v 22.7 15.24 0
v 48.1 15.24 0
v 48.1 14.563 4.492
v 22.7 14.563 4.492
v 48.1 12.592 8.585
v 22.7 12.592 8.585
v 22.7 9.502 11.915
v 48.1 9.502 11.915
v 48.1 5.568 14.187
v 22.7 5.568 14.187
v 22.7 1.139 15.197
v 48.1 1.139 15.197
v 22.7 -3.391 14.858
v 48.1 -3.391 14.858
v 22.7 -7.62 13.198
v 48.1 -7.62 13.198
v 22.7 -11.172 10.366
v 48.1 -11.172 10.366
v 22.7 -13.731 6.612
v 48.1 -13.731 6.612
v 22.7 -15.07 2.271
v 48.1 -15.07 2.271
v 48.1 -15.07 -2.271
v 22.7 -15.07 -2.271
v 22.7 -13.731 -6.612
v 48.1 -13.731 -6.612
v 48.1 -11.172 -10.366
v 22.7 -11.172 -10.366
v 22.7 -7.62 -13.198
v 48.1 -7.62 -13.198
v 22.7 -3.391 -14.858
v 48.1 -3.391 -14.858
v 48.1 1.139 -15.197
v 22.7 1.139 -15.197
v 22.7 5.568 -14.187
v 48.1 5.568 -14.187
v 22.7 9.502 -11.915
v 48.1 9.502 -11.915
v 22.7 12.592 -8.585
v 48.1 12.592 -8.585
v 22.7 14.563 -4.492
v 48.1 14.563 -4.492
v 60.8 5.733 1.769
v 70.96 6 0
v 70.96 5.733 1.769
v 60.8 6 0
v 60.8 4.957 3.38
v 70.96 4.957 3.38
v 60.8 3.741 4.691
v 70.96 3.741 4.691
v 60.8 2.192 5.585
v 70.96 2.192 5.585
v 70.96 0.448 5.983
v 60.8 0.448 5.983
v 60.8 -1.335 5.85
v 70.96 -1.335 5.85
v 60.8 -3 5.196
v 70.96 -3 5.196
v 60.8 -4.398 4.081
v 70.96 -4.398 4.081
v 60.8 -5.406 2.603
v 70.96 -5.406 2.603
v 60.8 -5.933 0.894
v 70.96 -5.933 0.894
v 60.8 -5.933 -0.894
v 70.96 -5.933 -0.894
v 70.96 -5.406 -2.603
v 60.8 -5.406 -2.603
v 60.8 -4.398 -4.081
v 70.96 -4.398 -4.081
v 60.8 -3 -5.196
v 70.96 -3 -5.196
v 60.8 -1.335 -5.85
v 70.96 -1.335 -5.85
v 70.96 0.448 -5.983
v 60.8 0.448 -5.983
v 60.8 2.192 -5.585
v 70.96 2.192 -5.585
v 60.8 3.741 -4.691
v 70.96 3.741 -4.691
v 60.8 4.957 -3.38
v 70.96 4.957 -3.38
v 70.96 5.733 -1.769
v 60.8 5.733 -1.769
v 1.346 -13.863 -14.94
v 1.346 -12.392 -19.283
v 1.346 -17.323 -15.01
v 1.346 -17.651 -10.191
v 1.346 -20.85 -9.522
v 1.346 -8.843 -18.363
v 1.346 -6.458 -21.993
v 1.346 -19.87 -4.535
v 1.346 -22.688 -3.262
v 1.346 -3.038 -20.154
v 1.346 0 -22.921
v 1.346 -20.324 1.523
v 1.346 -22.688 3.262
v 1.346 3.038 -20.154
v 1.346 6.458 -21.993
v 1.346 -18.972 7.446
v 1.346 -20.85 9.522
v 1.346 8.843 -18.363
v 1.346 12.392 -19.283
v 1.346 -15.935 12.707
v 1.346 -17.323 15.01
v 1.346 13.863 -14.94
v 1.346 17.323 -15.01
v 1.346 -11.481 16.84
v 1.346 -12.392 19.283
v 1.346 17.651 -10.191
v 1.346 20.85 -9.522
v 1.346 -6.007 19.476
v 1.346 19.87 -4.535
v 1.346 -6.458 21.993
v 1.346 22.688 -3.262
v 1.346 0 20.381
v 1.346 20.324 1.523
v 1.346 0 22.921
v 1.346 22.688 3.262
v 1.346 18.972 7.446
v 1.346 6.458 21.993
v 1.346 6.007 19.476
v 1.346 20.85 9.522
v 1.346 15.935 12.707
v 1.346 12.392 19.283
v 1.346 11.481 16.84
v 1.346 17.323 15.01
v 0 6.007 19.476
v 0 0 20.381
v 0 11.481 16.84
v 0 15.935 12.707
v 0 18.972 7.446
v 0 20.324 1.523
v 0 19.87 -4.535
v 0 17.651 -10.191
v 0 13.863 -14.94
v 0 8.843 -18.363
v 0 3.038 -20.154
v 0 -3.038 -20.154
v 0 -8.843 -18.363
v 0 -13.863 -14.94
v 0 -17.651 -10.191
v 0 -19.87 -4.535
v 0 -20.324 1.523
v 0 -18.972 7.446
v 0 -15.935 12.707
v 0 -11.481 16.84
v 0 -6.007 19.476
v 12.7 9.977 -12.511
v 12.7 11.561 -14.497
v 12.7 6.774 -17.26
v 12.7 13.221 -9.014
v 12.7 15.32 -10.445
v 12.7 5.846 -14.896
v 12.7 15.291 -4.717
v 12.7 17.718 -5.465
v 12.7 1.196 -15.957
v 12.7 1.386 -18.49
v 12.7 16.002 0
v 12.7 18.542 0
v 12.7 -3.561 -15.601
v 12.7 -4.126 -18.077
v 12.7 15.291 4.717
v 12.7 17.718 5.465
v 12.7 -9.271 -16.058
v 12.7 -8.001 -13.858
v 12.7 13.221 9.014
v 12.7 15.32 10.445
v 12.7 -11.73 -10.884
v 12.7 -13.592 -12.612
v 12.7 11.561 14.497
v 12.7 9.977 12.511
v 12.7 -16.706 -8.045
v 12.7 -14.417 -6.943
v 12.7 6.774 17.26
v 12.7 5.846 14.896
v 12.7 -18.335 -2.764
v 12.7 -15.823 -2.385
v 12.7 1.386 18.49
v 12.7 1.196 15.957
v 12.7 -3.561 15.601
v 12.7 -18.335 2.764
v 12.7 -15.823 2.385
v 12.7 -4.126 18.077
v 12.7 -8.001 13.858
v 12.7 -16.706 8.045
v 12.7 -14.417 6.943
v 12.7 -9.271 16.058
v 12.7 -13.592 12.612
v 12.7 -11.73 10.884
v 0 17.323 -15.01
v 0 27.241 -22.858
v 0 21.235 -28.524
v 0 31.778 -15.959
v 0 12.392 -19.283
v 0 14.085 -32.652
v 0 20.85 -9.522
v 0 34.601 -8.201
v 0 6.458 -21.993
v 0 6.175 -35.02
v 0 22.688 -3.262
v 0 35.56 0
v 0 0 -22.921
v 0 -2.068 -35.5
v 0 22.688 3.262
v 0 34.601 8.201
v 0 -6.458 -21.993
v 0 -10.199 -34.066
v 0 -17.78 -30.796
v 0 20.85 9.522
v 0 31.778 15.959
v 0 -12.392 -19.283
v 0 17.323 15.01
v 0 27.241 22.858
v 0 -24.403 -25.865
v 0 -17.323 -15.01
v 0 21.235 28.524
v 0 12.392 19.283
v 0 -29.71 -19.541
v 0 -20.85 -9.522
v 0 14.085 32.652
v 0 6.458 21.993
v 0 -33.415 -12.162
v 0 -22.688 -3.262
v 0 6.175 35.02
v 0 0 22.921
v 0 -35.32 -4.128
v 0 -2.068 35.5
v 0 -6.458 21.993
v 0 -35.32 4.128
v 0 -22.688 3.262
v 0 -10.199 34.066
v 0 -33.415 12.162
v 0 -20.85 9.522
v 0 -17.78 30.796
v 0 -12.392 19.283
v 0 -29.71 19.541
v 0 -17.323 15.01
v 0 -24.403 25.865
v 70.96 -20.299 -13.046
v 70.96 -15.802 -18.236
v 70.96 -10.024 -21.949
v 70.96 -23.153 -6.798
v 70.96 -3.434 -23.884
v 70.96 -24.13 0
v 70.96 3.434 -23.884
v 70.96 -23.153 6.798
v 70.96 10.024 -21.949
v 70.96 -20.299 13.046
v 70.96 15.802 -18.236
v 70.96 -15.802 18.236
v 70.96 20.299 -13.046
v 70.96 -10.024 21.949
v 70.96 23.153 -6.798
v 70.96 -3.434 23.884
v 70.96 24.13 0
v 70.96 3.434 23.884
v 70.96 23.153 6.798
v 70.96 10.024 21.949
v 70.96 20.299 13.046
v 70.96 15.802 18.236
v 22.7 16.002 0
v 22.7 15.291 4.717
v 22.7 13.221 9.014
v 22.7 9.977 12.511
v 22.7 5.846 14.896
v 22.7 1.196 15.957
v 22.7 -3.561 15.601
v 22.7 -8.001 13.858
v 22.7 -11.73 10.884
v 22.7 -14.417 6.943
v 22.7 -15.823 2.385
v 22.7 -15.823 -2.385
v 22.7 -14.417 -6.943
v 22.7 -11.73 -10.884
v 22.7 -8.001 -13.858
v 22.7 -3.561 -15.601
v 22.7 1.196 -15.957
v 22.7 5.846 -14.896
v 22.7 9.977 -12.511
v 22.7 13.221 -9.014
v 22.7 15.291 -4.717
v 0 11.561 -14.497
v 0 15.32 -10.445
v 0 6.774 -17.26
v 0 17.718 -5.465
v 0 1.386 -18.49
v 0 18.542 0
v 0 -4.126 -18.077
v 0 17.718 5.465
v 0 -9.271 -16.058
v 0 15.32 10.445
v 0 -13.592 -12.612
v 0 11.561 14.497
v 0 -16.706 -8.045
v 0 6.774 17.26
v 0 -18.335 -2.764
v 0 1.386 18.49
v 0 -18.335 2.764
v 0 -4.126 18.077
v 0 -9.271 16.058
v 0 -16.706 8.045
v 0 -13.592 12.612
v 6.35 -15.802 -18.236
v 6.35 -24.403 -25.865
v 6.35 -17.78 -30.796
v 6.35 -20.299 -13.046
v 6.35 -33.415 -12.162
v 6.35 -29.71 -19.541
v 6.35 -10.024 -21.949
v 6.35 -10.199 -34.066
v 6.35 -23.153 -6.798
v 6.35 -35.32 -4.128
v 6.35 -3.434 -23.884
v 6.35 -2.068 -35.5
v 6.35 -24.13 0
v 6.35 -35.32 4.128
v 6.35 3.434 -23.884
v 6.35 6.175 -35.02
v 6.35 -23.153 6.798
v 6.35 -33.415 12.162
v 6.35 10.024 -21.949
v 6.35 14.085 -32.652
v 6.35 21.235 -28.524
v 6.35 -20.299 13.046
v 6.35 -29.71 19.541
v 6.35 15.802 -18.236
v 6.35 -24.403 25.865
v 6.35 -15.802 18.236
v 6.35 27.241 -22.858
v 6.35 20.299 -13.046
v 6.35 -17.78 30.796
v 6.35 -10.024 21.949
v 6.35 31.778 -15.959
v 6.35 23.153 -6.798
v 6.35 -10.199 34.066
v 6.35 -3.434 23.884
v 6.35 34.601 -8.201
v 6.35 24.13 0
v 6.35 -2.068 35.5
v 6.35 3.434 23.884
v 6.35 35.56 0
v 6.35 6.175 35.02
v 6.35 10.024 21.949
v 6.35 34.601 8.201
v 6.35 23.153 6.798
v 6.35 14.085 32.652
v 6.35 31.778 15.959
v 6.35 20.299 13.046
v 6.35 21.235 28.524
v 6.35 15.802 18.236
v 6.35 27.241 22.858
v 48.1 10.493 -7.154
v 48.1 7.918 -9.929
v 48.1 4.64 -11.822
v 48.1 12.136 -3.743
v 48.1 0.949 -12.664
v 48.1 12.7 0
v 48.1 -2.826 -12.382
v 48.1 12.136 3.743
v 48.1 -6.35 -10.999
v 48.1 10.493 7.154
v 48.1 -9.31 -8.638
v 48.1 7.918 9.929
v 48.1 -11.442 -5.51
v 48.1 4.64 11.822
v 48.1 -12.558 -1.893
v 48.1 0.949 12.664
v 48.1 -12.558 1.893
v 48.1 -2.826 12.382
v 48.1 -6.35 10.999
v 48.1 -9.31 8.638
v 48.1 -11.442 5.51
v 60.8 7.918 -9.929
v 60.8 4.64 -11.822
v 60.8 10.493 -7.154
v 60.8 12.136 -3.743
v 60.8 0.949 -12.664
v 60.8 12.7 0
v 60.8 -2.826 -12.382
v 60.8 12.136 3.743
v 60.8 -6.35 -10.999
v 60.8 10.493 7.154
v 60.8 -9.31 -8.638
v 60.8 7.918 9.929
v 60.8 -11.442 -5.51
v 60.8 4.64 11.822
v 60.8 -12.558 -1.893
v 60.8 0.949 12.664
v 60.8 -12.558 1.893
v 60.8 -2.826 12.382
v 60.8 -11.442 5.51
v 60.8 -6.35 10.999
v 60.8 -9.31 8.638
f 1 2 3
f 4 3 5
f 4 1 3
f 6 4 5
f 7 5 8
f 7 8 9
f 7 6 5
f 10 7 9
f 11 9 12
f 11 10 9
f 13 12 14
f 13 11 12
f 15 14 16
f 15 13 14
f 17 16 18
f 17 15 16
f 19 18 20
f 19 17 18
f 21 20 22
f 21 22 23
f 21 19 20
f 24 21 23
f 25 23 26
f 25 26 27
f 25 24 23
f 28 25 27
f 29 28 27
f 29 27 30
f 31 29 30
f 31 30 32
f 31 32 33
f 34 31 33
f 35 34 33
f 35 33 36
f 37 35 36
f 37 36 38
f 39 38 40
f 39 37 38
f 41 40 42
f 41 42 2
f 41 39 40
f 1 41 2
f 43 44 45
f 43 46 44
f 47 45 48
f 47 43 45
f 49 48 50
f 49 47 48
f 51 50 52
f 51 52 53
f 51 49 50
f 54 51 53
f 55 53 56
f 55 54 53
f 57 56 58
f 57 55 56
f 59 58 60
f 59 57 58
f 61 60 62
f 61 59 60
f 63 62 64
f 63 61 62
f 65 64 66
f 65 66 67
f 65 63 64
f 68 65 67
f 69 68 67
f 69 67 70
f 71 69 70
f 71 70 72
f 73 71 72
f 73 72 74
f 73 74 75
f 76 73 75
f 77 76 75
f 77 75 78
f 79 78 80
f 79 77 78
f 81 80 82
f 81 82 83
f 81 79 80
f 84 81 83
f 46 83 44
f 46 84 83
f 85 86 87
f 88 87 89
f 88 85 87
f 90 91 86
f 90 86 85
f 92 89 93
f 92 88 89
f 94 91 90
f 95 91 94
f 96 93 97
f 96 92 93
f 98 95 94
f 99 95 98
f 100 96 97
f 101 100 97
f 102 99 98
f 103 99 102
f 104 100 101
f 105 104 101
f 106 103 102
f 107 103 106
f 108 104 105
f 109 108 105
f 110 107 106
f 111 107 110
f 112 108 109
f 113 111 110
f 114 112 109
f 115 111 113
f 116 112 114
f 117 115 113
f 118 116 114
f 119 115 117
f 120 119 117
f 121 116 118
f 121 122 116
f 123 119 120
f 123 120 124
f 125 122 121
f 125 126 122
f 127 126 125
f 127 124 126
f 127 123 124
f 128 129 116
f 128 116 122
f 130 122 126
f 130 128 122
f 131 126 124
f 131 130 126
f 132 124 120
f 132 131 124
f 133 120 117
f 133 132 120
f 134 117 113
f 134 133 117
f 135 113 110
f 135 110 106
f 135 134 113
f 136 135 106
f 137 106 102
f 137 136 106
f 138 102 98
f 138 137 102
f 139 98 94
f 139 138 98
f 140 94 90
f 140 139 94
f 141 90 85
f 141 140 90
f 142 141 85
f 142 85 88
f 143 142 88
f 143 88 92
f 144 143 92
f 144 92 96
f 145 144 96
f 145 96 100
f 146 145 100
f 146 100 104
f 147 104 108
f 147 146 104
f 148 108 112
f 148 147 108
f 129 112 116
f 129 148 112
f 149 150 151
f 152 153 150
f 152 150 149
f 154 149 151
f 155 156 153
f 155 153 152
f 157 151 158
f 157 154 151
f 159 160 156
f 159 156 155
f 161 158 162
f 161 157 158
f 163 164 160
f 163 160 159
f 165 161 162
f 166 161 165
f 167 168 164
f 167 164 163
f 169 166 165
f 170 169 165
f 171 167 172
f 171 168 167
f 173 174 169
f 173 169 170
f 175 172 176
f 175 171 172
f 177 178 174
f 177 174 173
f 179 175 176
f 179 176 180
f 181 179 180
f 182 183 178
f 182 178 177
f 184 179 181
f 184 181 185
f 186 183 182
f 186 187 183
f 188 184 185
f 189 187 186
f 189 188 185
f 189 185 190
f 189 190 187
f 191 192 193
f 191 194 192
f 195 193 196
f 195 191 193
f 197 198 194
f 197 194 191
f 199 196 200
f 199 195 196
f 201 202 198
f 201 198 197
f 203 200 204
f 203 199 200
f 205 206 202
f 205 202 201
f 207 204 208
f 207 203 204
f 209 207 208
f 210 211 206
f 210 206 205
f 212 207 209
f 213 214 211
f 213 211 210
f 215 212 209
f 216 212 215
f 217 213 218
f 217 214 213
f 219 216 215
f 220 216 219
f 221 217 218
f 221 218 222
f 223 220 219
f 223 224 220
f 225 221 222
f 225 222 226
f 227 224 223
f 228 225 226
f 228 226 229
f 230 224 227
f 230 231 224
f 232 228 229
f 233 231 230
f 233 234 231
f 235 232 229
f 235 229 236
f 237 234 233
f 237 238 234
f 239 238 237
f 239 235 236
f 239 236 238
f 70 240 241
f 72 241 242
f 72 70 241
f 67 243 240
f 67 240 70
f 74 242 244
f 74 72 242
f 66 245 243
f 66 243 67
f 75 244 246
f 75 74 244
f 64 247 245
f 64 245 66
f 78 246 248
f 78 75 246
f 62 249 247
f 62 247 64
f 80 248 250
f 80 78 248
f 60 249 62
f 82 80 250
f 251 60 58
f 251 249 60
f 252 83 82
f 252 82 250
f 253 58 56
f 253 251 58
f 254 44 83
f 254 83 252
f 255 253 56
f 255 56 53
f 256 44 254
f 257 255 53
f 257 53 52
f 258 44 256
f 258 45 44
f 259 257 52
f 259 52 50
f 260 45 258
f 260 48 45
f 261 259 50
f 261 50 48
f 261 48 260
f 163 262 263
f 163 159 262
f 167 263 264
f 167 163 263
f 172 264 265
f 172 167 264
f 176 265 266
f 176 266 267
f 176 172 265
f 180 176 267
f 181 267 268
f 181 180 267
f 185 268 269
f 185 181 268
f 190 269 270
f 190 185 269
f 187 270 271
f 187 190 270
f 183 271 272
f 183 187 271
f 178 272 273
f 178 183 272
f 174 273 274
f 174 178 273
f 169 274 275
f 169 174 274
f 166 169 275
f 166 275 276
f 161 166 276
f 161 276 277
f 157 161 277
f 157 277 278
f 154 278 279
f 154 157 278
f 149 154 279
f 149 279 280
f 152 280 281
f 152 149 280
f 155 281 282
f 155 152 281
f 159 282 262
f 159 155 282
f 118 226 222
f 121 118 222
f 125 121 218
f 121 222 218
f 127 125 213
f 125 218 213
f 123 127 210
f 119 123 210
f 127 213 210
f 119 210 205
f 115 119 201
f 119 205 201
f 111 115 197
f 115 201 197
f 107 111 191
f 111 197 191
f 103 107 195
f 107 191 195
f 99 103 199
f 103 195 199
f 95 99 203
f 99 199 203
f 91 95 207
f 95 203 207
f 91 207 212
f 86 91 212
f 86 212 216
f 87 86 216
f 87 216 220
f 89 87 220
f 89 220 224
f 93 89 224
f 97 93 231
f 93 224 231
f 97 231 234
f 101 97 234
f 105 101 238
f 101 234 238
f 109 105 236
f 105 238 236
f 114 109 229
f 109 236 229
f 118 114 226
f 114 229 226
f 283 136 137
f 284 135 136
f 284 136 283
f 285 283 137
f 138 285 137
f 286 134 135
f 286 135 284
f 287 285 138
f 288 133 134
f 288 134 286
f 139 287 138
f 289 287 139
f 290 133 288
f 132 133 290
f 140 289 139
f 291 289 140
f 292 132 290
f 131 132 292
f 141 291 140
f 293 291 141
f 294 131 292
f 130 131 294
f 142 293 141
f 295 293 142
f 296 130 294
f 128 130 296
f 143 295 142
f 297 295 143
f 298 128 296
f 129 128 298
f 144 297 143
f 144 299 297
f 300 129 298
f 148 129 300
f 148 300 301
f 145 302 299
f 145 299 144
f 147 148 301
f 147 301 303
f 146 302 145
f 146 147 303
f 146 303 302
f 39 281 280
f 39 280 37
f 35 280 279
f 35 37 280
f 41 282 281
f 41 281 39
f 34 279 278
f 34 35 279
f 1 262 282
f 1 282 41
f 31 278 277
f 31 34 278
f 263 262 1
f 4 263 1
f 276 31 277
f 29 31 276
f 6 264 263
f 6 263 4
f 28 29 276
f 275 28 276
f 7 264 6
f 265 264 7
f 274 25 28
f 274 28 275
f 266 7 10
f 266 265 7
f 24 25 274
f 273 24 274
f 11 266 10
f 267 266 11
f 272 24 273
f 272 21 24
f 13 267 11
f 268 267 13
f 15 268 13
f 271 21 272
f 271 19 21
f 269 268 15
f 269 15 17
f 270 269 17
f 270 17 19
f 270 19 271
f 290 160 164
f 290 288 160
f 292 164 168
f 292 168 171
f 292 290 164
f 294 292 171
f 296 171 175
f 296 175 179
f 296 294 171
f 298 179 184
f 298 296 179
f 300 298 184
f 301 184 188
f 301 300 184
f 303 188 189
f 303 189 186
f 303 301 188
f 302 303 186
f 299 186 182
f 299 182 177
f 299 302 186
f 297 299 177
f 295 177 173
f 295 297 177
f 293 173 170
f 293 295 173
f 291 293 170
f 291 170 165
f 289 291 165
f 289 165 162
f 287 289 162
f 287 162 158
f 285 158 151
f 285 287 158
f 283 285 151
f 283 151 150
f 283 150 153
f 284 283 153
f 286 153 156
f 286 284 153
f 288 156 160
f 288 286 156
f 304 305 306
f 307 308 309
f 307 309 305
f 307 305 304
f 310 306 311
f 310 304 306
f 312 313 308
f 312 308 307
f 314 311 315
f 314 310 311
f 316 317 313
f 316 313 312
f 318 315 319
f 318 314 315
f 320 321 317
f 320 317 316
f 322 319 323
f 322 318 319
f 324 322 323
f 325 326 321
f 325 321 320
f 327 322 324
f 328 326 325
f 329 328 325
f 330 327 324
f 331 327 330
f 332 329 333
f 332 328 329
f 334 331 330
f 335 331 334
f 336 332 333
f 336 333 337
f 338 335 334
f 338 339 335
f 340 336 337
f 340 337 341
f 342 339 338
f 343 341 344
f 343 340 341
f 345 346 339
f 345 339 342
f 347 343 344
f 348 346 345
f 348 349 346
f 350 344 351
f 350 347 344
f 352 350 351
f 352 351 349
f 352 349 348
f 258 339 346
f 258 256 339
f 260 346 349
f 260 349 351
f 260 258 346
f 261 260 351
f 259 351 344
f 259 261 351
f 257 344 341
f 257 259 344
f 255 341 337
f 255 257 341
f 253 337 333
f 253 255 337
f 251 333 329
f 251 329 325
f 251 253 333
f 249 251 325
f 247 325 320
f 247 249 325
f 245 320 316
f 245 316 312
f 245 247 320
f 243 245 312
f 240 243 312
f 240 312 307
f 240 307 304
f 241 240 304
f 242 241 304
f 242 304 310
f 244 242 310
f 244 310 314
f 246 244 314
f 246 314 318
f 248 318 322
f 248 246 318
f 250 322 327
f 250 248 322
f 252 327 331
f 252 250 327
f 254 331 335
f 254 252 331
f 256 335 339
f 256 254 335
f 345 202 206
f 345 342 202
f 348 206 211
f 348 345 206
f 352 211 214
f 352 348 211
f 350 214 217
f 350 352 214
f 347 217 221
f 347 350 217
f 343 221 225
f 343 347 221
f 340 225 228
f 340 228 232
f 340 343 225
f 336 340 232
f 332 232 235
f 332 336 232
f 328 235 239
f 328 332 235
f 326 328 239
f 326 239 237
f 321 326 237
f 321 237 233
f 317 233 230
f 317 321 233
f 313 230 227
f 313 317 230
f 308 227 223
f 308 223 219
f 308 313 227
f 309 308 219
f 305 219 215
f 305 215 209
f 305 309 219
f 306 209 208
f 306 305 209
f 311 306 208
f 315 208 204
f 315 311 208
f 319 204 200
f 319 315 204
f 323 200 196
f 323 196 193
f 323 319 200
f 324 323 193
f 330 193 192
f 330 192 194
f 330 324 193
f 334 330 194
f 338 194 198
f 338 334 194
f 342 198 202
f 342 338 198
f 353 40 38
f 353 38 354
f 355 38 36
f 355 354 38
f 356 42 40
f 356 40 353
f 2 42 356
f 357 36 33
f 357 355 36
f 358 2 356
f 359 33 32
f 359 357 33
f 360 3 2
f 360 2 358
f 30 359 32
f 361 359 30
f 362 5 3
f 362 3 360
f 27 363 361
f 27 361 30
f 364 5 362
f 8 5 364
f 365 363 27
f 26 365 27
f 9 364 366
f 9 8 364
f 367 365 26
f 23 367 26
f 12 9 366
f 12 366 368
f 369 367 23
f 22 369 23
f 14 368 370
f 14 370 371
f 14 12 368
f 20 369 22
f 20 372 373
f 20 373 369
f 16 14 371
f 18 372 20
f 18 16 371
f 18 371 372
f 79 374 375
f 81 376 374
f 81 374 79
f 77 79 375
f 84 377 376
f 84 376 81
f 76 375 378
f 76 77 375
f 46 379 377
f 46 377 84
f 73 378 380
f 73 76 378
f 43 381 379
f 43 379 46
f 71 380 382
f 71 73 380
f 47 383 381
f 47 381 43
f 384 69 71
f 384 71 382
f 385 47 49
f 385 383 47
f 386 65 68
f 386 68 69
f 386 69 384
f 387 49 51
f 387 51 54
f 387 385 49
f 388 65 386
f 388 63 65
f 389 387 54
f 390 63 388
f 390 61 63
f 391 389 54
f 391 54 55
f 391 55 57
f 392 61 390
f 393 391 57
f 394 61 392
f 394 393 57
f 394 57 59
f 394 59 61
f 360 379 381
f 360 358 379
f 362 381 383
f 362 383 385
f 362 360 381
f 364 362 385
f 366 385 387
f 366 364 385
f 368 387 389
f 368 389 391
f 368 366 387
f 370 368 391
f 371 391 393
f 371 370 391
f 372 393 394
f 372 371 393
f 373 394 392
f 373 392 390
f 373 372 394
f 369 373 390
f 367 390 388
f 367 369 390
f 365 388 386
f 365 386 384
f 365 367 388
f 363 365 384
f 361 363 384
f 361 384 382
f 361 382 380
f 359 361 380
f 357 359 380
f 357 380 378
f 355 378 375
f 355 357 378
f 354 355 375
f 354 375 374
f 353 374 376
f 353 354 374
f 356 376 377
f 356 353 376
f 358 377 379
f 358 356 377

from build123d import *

# Parameters (mm, degrees)
SKETCH6_R          = 22.921214
SKETCH6_R_2        = 20.381214
CUT_EXTRUDE2_DEPTH = 1.3462


with BuildPart() as part:
    # Sketch1 → Revolve1 (revolve)
    with BuildSketch(Plane.XY):
        Polygon((0, 35.56), (6.35, 35.56), (6.35, 24.13), (70.9600054, 24.13), (70.9600054, 5.999988), (60.8000054, 5.999988), (60.8000054, 12.7), (48.1000054, 12.7), (48.1000054, 15.24), (22.7000054, 15.24), (22.7000054, 16.002), (12.7, 16.002), (12.7, 18.542), (0, 18.542), align=None)
    revolve(axis=Axis((0, 0, 0), (1, 0, 0)))

    # Sketch6 → Cut-Extrude2 (cut)
    with BuildSketch(Plane.ZY):
        Circle(SKETCH6_R)
        Circle(SKETCH6_R_2, mode=Mode.SUBTRACT)
    extrude(amount=-CUT_EXTRUDE2_DEPTH, mode=Mode.SUBTRACT)


solid = part.part
